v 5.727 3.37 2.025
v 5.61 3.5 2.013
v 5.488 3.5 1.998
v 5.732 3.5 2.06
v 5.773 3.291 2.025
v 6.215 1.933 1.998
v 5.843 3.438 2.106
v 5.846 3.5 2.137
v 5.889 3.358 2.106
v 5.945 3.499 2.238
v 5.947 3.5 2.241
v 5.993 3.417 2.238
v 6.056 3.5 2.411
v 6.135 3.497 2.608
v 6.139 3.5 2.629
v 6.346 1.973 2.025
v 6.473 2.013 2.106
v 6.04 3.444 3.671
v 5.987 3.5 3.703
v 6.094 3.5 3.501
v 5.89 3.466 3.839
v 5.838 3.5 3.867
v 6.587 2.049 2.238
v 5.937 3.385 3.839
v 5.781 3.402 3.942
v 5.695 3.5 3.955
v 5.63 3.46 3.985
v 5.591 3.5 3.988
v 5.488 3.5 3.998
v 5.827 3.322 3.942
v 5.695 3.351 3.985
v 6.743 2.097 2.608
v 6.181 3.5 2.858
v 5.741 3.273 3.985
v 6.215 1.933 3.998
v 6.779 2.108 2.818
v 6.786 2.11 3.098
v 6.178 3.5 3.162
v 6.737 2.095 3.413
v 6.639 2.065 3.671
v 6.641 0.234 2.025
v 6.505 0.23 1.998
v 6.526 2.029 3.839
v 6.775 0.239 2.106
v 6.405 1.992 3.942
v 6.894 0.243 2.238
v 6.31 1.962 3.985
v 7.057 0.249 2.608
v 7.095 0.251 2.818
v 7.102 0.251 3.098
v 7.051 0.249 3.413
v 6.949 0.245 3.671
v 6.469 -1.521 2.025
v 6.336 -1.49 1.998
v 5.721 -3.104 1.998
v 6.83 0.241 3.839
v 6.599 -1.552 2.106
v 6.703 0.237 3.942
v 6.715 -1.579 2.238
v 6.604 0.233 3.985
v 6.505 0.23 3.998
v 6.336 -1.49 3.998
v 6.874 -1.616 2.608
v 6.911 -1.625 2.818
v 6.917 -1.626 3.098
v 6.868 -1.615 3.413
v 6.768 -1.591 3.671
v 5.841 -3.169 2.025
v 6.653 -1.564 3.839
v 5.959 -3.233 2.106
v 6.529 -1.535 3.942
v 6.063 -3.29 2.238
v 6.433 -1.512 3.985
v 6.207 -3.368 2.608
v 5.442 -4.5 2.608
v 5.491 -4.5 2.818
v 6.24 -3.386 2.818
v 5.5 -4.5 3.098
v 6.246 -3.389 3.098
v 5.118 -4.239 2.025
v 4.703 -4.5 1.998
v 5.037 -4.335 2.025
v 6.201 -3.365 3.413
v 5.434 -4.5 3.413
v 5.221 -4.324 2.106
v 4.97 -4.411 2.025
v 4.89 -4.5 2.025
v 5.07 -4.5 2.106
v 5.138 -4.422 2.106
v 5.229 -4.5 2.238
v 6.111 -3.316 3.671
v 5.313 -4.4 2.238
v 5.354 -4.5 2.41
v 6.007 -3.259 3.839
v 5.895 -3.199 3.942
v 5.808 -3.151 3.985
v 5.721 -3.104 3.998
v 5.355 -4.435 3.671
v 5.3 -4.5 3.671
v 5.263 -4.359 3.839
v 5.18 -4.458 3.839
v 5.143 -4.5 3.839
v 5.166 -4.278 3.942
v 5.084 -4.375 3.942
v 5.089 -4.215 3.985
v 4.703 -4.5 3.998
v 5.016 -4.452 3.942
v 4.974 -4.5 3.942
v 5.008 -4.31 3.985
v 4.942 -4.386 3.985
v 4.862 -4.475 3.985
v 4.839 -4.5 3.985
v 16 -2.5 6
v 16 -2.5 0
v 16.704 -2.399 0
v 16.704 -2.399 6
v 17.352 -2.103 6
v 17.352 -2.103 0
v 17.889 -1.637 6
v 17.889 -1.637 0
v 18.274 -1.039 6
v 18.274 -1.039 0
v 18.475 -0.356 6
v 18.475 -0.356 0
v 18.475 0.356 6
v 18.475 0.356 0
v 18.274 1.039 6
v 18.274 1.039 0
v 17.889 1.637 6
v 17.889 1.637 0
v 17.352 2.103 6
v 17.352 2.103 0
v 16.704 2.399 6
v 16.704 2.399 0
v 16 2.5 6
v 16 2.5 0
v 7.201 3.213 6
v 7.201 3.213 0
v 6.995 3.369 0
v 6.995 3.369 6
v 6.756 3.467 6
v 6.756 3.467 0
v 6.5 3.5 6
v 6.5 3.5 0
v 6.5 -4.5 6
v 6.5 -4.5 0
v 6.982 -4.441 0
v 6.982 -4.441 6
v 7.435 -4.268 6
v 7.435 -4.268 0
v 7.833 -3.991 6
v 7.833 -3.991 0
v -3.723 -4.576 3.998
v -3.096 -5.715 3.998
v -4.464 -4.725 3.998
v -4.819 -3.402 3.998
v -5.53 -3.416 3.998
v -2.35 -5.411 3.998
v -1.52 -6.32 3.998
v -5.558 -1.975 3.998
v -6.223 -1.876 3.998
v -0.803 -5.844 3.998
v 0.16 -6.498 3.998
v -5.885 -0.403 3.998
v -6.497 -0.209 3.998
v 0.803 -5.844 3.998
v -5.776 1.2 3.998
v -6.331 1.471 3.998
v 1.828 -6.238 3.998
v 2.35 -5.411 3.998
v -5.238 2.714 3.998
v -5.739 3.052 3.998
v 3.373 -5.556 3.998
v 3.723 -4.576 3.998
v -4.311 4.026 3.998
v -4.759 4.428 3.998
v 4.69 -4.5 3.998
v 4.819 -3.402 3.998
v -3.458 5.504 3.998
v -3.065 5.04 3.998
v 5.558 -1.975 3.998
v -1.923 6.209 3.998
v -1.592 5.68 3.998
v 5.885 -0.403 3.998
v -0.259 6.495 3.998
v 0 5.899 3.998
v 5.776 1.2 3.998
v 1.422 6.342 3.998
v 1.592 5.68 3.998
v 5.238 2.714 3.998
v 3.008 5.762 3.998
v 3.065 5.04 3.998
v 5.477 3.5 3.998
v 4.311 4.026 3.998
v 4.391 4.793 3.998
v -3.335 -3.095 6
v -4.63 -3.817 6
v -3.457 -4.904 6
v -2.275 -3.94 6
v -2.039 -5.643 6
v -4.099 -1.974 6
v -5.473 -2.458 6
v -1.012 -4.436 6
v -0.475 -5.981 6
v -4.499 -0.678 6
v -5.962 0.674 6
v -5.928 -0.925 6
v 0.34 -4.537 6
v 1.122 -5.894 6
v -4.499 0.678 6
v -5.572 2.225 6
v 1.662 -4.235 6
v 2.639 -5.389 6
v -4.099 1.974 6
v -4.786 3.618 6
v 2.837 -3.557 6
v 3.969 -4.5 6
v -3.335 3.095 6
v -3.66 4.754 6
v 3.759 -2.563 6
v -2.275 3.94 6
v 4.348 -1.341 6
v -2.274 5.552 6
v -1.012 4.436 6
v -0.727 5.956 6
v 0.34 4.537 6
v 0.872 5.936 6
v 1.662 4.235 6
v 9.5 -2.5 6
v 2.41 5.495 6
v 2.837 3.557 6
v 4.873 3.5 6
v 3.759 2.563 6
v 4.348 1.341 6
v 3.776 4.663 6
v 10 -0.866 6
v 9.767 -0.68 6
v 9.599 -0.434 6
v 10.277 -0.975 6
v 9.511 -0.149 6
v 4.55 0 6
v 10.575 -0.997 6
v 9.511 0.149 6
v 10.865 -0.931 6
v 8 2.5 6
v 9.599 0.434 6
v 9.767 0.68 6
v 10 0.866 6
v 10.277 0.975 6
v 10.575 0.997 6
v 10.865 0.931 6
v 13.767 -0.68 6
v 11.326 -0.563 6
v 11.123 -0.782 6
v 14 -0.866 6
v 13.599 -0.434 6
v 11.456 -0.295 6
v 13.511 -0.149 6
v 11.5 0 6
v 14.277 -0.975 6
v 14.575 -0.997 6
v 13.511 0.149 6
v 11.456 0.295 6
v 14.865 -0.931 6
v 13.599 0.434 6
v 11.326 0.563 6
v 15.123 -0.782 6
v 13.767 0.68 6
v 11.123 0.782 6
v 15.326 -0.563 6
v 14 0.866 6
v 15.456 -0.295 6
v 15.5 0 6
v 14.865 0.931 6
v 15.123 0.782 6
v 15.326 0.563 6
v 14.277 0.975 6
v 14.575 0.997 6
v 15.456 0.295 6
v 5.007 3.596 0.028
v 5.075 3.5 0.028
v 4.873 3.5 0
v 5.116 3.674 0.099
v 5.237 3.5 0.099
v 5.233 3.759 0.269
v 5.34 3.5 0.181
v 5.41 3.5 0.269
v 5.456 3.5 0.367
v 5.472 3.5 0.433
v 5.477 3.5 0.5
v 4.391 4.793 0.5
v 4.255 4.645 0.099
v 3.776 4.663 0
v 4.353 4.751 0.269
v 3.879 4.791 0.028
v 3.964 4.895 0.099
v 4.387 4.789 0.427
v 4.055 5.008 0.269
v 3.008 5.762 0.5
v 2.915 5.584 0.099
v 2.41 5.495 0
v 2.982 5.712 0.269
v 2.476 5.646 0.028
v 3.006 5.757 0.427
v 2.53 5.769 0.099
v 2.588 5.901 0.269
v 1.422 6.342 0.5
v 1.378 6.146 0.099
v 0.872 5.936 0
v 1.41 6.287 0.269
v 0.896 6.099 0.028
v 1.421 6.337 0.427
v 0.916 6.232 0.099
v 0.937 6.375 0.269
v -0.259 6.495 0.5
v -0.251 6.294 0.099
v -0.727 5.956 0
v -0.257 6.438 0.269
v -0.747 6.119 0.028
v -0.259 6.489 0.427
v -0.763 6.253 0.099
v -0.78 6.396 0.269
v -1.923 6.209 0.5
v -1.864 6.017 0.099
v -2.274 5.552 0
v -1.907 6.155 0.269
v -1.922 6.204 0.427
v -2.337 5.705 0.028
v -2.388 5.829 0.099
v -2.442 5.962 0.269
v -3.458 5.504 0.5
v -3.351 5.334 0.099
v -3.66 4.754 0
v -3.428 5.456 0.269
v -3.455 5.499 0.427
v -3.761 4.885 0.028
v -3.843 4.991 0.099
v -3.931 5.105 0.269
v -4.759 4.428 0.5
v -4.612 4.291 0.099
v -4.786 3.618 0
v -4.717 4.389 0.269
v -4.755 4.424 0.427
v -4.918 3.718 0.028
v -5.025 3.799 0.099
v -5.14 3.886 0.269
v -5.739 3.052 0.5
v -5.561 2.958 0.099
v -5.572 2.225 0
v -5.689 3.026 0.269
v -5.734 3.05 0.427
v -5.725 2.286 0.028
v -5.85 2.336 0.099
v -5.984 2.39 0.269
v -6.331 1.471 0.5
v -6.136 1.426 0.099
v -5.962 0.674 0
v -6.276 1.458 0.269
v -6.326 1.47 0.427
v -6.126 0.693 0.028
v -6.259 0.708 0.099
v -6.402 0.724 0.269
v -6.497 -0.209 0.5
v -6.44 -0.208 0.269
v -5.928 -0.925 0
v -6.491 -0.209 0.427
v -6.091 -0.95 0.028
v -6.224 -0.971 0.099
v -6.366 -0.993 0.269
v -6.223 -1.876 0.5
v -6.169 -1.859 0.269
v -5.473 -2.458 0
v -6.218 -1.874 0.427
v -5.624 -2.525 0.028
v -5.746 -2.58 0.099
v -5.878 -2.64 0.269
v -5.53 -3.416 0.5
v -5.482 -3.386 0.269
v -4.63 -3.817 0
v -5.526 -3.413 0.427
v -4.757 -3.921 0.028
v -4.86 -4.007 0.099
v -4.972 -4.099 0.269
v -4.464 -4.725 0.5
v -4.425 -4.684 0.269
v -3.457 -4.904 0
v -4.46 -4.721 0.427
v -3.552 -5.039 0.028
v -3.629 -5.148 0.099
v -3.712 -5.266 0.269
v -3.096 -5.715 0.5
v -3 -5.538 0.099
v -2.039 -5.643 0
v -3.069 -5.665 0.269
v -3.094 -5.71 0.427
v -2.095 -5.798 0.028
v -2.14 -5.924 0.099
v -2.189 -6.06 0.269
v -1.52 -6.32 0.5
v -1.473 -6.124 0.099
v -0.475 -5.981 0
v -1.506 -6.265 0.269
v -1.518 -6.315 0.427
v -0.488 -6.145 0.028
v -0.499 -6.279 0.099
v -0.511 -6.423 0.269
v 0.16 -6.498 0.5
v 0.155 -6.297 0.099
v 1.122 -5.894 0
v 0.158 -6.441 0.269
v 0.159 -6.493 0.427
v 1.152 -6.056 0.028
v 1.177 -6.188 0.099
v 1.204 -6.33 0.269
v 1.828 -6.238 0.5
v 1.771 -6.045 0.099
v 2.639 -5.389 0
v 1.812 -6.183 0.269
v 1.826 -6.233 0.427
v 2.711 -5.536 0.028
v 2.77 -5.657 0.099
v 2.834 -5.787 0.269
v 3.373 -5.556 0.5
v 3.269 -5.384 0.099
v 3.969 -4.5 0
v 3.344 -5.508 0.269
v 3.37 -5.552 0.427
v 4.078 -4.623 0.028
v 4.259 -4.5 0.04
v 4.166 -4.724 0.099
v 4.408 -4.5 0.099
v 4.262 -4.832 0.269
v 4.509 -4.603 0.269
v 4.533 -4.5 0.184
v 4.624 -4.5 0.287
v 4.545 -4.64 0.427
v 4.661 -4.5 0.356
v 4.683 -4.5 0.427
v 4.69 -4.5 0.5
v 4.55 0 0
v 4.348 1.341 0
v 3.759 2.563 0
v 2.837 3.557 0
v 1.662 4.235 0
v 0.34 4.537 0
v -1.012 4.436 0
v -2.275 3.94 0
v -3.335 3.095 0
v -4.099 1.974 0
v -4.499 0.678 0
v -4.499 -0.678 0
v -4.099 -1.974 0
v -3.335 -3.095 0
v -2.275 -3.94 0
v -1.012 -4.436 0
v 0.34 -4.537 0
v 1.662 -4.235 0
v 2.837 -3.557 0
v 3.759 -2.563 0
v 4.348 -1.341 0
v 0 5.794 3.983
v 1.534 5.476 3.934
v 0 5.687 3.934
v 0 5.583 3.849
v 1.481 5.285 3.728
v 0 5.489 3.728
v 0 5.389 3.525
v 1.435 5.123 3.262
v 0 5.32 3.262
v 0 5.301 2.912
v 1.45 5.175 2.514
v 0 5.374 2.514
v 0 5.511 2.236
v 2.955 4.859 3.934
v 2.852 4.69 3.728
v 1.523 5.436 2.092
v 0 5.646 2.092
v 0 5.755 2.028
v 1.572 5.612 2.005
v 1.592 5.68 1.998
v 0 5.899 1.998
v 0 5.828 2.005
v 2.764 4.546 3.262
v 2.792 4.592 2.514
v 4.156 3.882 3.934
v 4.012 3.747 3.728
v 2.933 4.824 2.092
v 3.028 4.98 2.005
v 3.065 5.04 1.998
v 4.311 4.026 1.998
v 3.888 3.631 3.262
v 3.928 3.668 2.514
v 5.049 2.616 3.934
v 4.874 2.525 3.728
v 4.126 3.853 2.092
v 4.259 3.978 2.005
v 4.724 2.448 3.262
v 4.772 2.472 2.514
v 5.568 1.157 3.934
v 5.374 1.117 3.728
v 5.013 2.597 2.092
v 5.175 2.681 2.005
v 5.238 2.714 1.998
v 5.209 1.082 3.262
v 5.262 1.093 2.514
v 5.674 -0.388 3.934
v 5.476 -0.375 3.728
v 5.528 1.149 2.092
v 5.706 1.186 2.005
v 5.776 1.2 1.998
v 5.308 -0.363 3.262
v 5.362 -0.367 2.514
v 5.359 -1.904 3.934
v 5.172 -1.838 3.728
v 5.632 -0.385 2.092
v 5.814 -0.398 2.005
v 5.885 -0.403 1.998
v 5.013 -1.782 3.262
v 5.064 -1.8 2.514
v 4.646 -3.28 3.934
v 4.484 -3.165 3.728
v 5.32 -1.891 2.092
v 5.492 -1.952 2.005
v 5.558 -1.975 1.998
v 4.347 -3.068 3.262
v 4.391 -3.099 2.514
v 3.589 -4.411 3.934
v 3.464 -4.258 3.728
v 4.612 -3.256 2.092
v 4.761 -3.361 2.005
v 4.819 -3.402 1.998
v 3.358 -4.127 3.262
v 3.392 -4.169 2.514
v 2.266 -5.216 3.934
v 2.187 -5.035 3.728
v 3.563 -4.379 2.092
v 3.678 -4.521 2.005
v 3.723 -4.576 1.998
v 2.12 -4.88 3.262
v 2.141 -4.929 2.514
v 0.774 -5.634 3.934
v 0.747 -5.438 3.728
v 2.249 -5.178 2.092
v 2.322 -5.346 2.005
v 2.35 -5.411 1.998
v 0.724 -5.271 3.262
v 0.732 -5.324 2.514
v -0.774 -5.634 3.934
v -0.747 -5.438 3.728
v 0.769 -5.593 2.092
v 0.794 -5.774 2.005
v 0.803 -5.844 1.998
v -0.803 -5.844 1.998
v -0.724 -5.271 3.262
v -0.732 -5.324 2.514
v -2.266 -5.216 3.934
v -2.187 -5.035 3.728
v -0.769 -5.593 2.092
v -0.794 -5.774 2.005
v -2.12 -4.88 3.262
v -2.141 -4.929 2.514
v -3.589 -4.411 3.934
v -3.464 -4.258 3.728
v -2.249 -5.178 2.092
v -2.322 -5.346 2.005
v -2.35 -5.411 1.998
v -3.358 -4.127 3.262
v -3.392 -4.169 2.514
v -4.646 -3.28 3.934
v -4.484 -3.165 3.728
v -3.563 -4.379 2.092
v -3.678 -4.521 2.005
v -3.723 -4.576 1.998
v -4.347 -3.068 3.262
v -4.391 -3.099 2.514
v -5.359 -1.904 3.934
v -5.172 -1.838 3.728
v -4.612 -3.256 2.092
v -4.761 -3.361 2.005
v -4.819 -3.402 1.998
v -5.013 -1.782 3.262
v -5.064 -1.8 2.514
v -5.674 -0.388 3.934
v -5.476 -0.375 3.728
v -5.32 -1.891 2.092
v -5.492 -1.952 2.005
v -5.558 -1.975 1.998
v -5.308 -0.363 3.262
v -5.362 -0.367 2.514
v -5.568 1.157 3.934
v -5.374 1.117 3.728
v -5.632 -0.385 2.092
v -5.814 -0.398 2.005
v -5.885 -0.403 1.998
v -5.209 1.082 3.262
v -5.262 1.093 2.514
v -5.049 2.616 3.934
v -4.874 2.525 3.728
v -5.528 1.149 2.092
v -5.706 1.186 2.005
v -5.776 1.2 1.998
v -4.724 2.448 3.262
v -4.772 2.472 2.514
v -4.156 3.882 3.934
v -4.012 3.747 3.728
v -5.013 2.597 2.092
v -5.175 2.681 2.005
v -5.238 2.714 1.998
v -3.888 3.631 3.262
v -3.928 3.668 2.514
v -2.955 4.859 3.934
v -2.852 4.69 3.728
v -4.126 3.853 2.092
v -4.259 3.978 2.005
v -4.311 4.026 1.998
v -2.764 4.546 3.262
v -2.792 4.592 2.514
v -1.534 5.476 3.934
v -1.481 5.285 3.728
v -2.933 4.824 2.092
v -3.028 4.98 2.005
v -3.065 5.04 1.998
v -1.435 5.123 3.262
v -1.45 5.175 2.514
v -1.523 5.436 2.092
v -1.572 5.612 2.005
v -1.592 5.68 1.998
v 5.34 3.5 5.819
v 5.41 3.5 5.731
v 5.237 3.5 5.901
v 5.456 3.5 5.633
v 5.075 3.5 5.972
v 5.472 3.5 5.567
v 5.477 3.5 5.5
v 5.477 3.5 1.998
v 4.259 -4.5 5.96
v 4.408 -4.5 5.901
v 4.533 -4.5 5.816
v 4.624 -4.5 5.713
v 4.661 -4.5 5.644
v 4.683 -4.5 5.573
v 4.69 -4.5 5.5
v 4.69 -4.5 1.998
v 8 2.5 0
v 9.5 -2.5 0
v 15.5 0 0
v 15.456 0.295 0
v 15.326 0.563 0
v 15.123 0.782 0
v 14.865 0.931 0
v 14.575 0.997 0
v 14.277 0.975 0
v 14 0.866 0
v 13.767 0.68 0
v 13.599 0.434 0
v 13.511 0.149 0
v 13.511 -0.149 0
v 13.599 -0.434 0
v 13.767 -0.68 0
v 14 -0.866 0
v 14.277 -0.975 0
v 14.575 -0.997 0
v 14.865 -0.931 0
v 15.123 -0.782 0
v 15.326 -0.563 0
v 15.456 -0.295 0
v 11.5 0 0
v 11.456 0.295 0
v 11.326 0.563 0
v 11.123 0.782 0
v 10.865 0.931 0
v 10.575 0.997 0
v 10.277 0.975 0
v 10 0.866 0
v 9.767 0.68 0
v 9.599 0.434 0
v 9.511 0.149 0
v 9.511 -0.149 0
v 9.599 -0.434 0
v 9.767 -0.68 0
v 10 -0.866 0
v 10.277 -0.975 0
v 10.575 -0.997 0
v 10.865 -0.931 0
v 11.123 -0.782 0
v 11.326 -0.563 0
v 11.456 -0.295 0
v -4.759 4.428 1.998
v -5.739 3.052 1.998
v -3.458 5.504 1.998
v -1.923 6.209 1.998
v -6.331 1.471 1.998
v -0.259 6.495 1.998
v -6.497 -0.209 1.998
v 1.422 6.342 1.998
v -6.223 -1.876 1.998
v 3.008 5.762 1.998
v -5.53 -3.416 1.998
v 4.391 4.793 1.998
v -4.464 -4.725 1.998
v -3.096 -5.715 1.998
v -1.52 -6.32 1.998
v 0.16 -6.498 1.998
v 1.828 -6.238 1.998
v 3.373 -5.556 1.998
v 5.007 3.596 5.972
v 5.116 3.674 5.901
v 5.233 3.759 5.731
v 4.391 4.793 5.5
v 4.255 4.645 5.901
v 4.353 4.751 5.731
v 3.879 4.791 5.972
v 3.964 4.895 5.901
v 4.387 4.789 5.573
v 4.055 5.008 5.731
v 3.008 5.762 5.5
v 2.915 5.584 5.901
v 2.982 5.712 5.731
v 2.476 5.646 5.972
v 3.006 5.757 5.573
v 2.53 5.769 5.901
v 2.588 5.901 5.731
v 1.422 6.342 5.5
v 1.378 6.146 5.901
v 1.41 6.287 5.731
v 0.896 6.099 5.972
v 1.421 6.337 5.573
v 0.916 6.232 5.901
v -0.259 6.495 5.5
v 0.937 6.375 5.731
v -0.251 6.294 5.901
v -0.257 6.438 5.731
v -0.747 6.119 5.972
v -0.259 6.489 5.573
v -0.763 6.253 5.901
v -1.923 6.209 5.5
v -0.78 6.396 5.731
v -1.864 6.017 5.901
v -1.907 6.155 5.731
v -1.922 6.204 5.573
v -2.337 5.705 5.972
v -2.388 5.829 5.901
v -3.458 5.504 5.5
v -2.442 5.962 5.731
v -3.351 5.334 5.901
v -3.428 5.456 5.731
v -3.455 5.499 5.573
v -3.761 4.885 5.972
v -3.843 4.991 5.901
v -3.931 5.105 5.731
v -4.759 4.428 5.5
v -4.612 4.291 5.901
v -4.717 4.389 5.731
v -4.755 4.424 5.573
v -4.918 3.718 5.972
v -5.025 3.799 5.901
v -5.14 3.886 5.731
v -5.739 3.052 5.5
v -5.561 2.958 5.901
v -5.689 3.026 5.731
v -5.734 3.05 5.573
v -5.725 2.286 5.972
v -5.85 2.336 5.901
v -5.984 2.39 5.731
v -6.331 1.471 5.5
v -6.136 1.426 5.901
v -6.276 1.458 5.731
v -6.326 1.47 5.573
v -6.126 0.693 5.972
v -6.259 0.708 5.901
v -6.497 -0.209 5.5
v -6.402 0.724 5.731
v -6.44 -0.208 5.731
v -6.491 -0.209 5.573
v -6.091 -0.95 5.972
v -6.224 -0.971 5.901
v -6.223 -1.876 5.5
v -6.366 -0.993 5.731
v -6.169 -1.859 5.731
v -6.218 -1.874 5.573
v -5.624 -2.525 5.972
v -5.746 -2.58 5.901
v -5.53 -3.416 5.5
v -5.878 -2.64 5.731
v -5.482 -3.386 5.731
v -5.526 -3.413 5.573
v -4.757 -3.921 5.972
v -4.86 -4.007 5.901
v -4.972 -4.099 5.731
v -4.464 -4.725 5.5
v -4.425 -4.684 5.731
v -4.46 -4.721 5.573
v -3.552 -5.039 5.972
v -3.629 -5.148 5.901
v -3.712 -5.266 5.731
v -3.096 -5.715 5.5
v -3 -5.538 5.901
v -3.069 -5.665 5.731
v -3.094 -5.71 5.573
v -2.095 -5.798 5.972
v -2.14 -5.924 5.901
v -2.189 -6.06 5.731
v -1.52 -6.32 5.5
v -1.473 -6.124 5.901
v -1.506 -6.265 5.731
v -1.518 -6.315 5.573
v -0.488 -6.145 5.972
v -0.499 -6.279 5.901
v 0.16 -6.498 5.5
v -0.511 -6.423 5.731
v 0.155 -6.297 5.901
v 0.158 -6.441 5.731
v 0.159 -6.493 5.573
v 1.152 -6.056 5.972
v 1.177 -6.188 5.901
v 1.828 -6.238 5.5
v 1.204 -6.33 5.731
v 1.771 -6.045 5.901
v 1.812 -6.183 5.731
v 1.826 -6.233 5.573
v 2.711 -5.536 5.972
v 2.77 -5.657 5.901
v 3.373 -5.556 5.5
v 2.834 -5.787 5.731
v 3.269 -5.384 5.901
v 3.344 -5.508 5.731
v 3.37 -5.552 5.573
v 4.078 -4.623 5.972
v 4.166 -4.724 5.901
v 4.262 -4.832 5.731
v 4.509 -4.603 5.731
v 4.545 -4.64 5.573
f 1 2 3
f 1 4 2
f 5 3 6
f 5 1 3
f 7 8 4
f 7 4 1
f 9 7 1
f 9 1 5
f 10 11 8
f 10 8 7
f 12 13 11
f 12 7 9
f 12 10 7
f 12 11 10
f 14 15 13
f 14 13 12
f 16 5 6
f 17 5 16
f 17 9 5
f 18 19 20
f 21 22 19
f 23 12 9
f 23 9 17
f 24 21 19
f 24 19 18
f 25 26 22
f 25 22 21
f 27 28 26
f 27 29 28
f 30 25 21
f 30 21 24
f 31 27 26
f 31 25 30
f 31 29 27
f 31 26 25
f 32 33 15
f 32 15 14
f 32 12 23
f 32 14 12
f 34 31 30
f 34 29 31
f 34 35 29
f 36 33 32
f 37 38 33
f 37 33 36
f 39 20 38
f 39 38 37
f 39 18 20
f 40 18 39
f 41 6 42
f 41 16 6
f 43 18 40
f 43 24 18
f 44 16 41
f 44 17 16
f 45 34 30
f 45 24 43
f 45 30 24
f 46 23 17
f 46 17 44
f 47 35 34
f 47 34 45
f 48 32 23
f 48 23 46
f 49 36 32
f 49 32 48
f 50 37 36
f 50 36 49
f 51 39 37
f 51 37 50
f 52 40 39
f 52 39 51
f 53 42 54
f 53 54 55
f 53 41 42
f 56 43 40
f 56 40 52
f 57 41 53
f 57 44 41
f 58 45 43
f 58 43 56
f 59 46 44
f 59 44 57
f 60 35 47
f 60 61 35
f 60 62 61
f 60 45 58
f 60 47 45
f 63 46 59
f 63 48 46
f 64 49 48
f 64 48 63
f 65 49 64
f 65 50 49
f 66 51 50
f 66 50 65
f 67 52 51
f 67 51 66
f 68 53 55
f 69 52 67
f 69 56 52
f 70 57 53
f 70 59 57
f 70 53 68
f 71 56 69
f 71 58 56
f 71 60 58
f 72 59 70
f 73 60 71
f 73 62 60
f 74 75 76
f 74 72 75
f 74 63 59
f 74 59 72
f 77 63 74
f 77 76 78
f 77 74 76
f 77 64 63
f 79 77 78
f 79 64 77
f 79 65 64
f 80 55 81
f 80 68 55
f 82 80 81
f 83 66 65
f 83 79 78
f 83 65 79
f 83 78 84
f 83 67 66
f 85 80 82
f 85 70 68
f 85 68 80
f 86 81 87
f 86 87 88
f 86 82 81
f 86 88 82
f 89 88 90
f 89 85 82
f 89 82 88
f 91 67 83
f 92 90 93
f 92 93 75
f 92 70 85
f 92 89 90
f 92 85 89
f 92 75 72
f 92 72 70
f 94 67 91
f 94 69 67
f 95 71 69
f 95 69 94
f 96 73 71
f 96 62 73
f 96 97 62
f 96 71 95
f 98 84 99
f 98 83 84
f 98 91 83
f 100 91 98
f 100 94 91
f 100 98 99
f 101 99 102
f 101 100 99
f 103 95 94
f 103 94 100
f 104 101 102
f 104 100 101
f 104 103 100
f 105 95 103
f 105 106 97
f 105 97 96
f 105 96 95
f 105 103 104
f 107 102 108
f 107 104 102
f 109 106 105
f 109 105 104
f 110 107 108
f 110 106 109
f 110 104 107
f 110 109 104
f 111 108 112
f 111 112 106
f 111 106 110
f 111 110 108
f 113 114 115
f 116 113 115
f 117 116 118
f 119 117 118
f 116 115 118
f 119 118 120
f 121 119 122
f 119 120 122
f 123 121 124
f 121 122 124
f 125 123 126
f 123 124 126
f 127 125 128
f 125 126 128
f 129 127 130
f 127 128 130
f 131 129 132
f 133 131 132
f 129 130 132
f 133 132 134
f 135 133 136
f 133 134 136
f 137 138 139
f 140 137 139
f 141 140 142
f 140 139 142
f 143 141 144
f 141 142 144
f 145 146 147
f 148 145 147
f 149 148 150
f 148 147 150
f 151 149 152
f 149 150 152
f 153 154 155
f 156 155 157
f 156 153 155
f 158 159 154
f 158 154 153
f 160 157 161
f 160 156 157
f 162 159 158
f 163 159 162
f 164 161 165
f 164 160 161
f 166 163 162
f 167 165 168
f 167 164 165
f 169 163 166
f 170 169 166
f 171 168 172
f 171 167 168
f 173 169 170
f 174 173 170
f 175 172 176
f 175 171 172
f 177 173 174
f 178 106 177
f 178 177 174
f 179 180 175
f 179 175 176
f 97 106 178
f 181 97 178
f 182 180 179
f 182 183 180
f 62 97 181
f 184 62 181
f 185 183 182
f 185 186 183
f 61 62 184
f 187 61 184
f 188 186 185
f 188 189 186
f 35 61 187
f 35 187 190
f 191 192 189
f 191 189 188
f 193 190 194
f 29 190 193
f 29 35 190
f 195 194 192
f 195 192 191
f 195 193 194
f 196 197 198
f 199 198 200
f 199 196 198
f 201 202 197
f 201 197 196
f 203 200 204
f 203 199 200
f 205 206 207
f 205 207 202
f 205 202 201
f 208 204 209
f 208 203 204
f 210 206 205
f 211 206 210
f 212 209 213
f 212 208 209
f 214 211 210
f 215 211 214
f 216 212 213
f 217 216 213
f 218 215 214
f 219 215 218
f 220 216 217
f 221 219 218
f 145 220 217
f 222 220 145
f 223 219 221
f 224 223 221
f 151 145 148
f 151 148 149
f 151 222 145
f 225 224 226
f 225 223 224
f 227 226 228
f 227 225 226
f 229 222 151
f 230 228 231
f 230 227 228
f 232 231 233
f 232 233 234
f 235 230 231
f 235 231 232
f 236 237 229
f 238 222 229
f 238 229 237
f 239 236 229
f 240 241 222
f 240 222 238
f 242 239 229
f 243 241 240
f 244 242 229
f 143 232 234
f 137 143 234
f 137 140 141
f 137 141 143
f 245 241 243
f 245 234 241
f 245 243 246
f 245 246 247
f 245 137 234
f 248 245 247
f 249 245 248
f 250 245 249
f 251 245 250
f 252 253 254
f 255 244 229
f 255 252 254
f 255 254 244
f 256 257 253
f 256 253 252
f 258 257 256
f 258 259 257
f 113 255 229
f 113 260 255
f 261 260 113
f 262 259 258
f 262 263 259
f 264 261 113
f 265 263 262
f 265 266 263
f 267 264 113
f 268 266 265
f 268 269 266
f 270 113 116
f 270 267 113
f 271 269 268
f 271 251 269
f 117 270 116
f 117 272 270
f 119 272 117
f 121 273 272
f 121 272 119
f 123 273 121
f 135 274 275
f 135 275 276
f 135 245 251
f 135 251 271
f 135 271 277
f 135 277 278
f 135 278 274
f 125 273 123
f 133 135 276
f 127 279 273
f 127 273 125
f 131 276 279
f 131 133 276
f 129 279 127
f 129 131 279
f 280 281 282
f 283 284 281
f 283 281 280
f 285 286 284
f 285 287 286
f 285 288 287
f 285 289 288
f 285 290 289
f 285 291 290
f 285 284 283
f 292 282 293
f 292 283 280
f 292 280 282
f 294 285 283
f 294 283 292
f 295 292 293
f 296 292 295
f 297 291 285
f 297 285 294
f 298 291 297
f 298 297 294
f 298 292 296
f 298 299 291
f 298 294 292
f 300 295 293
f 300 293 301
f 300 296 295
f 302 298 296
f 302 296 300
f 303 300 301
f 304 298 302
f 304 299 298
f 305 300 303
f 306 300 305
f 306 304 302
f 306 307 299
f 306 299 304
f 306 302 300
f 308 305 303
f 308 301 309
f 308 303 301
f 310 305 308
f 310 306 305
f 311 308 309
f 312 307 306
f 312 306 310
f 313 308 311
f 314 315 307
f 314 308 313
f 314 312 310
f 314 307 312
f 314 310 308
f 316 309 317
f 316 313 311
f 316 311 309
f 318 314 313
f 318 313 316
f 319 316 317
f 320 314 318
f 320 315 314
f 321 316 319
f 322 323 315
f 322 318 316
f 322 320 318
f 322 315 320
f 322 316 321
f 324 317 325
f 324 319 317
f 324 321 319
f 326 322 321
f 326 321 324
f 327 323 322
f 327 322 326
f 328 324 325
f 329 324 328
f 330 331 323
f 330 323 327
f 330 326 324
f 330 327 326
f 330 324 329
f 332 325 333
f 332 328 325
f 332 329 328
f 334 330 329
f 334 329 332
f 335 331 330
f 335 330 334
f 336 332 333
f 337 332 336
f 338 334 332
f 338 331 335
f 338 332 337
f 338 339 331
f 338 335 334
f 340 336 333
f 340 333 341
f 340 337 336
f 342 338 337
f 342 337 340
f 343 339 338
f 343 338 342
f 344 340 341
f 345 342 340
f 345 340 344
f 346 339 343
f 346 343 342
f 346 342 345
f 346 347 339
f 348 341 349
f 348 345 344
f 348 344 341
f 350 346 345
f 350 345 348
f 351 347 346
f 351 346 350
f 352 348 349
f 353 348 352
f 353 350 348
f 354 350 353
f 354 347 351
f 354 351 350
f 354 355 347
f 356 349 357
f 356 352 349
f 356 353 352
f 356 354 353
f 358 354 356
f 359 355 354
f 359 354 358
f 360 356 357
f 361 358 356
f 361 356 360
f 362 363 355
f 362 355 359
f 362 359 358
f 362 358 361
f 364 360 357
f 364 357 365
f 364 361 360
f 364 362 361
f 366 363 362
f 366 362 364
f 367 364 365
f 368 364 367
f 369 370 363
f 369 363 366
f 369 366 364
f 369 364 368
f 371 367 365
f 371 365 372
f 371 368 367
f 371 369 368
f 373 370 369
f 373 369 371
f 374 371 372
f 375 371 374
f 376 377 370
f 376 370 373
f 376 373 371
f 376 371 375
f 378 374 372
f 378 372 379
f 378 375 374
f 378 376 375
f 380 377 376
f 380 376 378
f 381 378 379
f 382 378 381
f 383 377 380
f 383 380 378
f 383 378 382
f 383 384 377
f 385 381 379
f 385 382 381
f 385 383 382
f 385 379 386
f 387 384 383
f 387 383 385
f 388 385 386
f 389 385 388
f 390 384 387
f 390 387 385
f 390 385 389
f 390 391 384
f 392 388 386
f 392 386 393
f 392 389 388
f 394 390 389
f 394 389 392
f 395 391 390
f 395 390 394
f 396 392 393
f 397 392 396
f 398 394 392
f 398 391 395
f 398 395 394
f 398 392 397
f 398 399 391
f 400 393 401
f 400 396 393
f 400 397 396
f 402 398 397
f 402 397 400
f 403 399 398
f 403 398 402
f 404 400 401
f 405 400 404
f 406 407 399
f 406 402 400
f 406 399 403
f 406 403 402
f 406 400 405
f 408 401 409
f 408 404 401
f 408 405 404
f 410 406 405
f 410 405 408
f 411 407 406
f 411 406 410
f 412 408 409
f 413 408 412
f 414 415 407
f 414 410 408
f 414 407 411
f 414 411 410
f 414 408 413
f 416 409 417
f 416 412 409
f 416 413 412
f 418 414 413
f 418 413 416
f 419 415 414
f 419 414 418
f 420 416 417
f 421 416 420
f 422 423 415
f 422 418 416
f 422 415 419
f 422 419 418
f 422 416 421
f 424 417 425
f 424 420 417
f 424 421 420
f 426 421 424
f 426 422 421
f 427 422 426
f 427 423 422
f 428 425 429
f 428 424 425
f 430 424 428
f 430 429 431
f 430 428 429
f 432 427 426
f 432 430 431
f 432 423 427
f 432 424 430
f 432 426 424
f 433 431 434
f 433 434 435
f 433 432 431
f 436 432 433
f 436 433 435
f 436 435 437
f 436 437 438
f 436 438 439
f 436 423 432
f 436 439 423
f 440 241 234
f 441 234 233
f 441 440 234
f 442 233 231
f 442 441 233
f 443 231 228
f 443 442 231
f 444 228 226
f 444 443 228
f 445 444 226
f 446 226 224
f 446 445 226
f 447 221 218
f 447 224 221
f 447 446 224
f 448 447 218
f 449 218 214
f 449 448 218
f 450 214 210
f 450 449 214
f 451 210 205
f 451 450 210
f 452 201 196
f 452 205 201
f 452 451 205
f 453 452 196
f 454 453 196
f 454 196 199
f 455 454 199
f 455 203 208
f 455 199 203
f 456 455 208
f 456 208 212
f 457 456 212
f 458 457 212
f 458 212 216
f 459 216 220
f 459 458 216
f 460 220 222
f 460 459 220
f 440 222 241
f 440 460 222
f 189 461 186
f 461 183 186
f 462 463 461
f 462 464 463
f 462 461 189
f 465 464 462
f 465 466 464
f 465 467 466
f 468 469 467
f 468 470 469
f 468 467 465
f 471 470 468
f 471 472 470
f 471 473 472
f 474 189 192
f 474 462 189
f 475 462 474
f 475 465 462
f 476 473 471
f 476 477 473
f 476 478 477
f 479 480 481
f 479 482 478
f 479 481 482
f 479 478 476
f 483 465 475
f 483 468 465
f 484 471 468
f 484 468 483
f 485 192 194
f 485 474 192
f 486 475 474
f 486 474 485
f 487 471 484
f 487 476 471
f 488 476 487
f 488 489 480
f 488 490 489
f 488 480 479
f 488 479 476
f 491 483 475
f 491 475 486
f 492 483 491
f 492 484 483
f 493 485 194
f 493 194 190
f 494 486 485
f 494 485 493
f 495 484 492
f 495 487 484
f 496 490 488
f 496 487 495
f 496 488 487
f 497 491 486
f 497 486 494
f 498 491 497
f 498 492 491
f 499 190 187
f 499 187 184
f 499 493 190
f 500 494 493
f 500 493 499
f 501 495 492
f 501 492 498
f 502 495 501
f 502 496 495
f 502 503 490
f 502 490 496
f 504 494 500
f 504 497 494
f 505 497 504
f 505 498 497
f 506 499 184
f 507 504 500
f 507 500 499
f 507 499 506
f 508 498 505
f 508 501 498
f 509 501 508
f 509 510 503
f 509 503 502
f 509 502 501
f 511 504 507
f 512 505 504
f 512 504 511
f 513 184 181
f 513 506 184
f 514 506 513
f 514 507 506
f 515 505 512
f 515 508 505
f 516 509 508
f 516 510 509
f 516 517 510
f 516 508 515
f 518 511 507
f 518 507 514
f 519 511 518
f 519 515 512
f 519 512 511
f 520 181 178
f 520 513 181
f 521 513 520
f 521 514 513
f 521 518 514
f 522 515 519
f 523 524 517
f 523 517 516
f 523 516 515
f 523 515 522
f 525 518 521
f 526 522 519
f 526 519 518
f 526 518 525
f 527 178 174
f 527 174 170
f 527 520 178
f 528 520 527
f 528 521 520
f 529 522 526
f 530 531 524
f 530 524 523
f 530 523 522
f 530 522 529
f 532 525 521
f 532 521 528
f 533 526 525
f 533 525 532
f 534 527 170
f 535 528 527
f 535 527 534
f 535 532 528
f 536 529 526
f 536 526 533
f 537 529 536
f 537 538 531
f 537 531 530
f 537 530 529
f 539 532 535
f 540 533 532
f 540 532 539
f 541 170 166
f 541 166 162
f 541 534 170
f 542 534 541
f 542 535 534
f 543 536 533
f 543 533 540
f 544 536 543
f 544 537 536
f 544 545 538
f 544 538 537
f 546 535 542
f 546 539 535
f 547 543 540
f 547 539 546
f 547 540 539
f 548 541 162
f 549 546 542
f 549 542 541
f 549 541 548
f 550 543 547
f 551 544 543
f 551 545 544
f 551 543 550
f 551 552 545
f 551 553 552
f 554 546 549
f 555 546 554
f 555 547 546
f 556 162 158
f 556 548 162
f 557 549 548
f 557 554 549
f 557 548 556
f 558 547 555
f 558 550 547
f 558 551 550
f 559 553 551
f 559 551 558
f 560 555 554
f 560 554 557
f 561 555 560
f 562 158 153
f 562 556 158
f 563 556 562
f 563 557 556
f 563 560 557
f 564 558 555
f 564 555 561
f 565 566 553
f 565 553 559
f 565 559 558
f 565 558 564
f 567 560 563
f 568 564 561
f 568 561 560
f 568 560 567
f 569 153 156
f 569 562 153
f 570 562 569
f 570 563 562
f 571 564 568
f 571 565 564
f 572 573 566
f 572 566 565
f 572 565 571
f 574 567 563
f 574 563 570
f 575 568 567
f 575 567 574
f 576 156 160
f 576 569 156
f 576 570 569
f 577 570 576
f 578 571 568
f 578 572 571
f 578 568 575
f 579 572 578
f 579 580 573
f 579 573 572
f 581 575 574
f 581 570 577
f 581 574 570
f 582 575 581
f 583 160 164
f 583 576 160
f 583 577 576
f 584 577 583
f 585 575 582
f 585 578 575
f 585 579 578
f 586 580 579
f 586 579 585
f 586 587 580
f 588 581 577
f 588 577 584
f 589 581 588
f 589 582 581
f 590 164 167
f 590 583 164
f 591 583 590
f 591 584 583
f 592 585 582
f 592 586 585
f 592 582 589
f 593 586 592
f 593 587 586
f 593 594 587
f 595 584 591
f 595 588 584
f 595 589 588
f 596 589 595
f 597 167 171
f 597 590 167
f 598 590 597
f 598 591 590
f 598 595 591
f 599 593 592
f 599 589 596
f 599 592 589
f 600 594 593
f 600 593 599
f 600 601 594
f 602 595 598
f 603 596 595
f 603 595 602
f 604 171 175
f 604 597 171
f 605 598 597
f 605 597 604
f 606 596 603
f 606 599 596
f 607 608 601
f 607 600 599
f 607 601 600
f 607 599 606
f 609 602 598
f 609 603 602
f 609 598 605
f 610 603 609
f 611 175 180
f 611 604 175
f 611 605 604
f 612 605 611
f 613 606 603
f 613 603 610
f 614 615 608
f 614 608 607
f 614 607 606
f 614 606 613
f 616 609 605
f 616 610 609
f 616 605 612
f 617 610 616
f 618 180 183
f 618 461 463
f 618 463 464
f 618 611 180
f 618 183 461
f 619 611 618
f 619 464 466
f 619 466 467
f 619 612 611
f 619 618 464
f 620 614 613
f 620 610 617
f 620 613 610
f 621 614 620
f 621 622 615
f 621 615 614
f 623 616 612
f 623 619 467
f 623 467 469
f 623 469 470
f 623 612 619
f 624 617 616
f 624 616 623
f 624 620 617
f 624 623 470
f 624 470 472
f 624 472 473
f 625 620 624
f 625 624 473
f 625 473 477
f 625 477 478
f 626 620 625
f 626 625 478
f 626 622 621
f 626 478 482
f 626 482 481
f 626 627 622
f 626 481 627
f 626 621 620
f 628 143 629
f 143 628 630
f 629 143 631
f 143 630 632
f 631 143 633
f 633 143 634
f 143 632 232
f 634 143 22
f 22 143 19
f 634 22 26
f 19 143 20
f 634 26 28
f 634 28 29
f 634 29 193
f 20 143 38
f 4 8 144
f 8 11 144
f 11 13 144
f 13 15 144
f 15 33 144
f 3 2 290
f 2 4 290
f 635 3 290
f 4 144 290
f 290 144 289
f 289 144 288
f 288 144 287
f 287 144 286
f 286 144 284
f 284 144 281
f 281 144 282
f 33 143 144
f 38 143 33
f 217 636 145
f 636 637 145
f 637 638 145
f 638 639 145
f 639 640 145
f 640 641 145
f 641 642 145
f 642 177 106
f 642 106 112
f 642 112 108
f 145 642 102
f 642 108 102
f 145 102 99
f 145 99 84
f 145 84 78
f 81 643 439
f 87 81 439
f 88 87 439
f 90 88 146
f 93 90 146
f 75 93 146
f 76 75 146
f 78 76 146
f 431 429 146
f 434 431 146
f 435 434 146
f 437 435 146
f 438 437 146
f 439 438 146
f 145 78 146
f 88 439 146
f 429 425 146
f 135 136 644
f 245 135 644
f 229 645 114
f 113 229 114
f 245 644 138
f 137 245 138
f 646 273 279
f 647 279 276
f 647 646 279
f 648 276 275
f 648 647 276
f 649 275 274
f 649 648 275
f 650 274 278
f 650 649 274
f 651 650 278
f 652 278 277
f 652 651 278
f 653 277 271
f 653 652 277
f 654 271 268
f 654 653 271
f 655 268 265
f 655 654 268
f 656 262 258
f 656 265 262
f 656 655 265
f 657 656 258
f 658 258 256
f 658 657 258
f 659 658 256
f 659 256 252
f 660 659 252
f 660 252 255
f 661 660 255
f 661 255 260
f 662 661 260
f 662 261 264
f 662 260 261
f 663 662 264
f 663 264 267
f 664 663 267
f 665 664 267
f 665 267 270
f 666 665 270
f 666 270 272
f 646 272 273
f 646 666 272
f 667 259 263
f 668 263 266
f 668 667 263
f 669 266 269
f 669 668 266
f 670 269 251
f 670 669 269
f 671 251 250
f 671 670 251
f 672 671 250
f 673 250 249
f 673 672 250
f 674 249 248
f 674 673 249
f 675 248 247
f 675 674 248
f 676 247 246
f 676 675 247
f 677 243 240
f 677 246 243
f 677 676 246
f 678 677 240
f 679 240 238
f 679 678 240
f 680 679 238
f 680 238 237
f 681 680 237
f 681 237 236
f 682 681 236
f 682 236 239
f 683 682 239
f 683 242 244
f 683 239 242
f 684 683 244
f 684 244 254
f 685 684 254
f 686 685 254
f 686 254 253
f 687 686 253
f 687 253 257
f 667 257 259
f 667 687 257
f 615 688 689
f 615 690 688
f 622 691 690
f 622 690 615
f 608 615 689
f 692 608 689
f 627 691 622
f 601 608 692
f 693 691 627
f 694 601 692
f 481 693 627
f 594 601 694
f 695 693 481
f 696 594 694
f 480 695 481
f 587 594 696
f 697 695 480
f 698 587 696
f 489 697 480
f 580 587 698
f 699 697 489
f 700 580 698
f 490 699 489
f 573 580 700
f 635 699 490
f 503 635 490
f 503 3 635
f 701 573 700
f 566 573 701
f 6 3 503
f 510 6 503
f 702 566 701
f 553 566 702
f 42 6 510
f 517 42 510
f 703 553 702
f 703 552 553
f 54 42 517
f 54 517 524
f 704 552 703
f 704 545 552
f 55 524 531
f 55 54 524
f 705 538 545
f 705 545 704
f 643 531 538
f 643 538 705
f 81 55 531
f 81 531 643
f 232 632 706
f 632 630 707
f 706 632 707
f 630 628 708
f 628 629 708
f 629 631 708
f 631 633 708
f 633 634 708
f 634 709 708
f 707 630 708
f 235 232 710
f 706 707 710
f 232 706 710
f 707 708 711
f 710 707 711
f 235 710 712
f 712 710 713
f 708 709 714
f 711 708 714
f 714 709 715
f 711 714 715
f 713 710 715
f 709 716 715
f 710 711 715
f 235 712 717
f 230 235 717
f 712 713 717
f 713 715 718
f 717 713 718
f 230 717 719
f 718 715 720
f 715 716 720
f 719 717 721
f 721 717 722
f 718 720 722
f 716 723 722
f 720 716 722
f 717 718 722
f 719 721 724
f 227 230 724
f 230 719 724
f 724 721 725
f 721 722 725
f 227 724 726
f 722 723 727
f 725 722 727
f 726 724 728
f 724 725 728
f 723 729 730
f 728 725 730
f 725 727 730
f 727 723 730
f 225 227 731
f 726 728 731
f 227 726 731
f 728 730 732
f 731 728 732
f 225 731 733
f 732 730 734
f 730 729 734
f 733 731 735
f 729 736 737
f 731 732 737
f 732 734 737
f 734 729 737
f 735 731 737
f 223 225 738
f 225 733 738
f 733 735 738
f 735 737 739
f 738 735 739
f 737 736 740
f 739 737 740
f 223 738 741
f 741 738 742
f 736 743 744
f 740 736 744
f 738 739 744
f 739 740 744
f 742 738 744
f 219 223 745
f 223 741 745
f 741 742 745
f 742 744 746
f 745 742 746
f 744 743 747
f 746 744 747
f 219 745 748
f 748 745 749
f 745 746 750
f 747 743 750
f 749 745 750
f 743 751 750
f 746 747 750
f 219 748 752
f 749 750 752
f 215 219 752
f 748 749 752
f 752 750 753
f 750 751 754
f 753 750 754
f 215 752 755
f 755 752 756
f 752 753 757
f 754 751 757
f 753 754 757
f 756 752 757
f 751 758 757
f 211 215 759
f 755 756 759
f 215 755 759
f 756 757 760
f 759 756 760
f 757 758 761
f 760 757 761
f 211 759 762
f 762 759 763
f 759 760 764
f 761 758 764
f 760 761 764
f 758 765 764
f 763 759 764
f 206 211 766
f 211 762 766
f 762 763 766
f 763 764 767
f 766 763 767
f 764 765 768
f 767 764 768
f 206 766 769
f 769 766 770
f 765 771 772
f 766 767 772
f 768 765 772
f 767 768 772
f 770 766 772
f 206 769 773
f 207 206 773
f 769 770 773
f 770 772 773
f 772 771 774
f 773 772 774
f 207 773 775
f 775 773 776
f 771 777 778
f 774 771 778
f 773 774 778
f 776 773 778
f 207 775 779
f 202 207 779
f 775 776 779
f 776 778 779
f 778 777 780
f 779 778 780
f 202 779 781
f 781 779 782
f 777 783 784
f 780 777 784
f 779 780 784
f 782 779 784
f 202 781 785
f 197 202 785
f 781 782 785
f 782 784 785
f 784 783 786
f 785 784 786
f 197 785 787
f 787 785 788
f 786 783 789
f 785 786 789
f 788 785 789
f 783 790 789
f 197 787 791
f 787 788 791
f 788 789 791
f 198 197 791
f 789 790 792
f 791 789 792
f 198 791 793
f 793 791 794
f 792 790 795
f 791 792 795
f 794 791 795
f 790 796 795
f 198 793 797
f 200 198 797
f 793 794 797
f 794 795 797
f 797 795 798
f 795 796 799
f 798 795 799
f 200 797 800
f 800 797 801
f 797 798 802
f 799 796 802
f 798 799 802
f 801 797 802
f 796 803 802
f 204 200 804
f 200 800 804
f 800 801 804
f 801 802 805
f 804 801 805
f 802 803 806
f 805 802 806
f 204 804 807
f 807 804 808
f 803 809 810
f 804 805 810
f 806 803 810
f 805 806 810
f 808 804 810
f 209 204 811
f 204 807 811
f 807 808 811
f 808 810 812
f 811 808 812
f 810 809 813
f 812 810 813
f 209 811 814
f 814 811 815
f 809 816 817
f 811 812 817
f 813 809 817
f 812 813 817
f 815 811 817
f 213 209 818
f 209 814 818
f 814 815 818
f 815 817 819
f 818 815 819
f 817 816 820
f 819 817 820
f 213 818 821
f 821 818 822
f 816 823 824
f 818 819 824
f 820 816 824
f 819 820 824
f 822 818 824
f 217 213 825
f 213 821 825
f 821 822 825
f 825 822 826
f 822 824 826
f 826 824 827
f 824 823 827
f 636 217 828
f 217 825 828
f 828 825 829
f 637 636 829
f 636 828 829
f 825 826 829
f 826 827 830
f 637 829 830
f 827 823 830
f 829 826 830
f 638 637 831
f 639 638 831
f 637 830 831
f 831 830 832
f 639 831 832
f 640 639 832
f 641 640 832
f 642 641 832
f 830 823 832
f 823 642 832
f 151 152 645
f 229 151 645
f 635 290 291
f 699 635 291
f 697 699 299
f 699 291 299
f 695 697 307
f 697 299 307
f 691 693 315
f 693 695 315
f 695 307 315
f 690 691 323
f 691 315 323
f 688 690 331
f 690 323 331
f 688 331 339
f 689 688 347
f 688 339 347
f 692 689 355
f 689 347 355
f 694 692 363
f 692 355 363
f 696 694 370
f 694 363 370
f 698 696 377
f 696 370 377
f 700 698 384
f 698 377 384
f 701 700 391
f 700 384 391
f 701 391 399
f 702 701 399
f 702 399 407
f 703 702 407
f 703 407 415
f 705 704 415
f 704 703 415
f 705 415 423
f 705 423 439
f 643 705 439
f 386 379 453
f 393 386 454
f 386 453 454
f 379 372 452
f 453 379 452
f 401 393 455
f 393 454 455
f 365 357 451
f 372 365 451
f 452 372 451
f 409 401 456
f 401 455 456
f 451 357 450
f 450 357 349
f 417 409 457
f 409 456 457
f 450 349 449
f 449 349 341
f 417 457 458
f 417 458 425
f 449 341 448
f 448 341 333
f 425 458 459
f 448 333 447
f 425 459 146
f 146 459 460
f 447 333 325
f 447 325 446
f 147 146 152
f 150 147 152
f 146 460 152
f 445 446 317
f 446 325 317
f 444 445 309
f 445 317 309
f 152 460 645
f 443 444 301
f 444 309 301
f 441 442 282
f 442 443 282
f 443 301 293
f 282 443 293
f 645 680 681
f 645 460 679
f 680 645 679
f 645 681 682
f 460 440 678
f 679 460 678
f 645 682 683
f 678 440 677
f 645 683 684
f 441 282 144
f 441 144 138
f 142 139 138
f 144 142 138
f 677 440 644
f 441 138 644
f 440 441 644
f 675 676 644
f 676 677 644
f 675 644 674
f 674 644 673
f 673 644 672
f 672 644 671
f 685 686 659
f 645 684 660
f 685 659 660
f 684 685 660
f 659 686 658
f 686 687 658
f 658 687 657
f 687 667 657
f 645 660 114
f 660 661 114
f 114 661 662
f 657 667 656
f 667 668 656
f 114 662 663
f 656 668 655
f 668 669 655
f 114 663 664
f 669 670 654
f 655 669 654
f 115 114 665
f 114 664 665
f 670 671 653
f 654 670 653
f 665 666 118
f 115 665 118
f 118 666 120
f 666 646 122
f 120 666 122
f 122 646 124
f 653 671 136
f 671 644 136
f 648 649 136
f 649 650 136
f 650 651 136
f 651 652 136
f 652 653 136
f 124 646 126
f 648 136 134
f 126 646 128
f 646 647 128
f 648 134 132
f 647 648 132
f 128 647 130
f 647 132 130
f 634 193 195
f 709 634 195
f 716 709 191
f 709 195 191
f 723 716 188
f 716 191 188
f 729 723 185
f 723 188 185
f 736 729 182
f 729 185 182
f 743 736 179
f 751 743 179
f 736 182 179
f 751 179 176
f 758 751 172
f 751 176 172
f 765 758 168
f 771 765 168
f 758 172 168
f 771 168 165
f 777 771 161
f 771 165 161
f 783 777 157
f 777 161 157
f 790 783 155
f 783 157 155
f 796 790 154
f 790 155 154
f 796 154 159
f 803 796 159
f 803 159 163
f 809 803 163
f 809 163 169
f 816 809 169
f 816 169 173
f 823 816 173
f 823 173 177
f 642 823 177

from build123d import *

# Parameters (mm, degrees)
BOSS_EXTRUDE1_DEPTH = 6
SKETCH1_5_R         = 4.55
CUT_EXTRUDE2_DEPTH  = 21.506096654
SKETCH1_6_R         = 1
CUT_EXTRUDE3_DEPTH  = 21.506096654
FILLET6_R           = 0.5
FILLET7_R           = 0.5


with BuildPart() as part:
    # Sketch1 → Boss-Extrude1 (new body)
    with BuildSketch(Plane.XY):
        with BuildLine():
            Line((9.5, -2.5), (16, -2.5))
            ThreePointArc((16, -2.5), (18.5, 0), (16, 2.5))
            Line((16, 2.5), (8, 2.5))
            Line((8, 2.5), (7.201136344, 3.213027227))
            ThreePointArc((7.201136344, 3.213027227), (6.878795969, 3.425480207), (6.5, 3.5))
            Line((6.5, 3.5), (5.477225575, 3.5))
            ThreePointArc((5.477225575, 3.5), (-6.468789112, 0.636213346), (4.69041576, -4.5))
            Line((4.69041576, -4.5), (6.5, -4.5))
            ThreePointArc((6.5, -4.5), (7.21364418, -4.368344718), (7.833333333, -3.990711985))
            Line((7.833333333, -3.990711985), (9.5, -2.5))
        make_face()
    extrude(amount=BOSS_EXTRUDE1_DEPTH)

    # Sketch1<5> → Cut-Extrude2 (cut, through all)
    with BuildSketch(Plane.XY):
        Circle(SKETCH1_5_R)
    extrude(amount=CUT_EXTRUDE2_DEPTH, mode=Mode.SUBTRACT)

    # Sketch1<6> → Cut-Extrude3 (cut, through all)
    with BuildSketch(Plane.XY):
        with Locations((14.5, 0)):
            Circle(SKETCH1_6_R)
        with Locations((10.5, 0)):
            Circle(SKETCH1_6_R)
    extrude(amount=CUT_EXTRUDE3_DEPTH, mode=Mode.SUBTRACT)

    # Sketch5 → Cut-Revolve2 (revolve, cut)
    with BuildSketch(Plane(origin=(0, 0, 0), x_dir=(0, 0, -1), z_dir=(1, 0, 0))):
        with BuildLine():
            Line((-3.998431193, 6.509033472), (-3.998431193, 5.899033472))
            add(Edge.make_bspline(
                [(-3.998431193, 5.899033472), (-3.998431193, 5.299033472), (-2.998431193, 5.299033472), (-1.998431193, 5.299033472), (-1.998431193, 5.899033472)],
                knots=[0, 0, 0, 1.570796327, 1.570796327, 3.141592654, 3.141592654, 3.141592654], degree=2, weights=[1, 0.707106781, 1, 0.707106781, 1]))
            Line((-1.998431193, 5.899033472), (-1.998431193, 6.509033472))
            add(Edge.make_bspline(
                [(-1.998431193, 6.509033472), (-1.998431193, 7.109033472), (-2.998431193, 7.109033472), (-3.998431193, 7.109033472), (-3.998431193, 6.509033472)],
                knots=[3.141592654, 3.141592654, 3.141592654, 4.71238898, 4.71238898, 6.283185307, 6.283185307, 6.283185307], degree=2, weights=[1, 0.707106781, 1, 0.707106781, 1]))
        make_face()
    revolve(axis=Axis((0, 0, 6.969963605), (0, 0, -1)), mode=Mode.SUBTRACT)

    # Fillet6
    fillet6_edges = [part.edges().sort_by_distance(p)[0] for p in [
        (-6.468789112, 0.636213346, 6),
    ]]
    fillet(fillet6_edges, radius=FILLET6_R)

    # Fillet7
    fillet7_edges = [part.edges().sort_by_distance(p)[0] for p in [
        (-6.468789112, 0.636213346, 0),
    ]]
    fillet(fillet7_edges, radius=FILLET7_R)


solid = part.part
